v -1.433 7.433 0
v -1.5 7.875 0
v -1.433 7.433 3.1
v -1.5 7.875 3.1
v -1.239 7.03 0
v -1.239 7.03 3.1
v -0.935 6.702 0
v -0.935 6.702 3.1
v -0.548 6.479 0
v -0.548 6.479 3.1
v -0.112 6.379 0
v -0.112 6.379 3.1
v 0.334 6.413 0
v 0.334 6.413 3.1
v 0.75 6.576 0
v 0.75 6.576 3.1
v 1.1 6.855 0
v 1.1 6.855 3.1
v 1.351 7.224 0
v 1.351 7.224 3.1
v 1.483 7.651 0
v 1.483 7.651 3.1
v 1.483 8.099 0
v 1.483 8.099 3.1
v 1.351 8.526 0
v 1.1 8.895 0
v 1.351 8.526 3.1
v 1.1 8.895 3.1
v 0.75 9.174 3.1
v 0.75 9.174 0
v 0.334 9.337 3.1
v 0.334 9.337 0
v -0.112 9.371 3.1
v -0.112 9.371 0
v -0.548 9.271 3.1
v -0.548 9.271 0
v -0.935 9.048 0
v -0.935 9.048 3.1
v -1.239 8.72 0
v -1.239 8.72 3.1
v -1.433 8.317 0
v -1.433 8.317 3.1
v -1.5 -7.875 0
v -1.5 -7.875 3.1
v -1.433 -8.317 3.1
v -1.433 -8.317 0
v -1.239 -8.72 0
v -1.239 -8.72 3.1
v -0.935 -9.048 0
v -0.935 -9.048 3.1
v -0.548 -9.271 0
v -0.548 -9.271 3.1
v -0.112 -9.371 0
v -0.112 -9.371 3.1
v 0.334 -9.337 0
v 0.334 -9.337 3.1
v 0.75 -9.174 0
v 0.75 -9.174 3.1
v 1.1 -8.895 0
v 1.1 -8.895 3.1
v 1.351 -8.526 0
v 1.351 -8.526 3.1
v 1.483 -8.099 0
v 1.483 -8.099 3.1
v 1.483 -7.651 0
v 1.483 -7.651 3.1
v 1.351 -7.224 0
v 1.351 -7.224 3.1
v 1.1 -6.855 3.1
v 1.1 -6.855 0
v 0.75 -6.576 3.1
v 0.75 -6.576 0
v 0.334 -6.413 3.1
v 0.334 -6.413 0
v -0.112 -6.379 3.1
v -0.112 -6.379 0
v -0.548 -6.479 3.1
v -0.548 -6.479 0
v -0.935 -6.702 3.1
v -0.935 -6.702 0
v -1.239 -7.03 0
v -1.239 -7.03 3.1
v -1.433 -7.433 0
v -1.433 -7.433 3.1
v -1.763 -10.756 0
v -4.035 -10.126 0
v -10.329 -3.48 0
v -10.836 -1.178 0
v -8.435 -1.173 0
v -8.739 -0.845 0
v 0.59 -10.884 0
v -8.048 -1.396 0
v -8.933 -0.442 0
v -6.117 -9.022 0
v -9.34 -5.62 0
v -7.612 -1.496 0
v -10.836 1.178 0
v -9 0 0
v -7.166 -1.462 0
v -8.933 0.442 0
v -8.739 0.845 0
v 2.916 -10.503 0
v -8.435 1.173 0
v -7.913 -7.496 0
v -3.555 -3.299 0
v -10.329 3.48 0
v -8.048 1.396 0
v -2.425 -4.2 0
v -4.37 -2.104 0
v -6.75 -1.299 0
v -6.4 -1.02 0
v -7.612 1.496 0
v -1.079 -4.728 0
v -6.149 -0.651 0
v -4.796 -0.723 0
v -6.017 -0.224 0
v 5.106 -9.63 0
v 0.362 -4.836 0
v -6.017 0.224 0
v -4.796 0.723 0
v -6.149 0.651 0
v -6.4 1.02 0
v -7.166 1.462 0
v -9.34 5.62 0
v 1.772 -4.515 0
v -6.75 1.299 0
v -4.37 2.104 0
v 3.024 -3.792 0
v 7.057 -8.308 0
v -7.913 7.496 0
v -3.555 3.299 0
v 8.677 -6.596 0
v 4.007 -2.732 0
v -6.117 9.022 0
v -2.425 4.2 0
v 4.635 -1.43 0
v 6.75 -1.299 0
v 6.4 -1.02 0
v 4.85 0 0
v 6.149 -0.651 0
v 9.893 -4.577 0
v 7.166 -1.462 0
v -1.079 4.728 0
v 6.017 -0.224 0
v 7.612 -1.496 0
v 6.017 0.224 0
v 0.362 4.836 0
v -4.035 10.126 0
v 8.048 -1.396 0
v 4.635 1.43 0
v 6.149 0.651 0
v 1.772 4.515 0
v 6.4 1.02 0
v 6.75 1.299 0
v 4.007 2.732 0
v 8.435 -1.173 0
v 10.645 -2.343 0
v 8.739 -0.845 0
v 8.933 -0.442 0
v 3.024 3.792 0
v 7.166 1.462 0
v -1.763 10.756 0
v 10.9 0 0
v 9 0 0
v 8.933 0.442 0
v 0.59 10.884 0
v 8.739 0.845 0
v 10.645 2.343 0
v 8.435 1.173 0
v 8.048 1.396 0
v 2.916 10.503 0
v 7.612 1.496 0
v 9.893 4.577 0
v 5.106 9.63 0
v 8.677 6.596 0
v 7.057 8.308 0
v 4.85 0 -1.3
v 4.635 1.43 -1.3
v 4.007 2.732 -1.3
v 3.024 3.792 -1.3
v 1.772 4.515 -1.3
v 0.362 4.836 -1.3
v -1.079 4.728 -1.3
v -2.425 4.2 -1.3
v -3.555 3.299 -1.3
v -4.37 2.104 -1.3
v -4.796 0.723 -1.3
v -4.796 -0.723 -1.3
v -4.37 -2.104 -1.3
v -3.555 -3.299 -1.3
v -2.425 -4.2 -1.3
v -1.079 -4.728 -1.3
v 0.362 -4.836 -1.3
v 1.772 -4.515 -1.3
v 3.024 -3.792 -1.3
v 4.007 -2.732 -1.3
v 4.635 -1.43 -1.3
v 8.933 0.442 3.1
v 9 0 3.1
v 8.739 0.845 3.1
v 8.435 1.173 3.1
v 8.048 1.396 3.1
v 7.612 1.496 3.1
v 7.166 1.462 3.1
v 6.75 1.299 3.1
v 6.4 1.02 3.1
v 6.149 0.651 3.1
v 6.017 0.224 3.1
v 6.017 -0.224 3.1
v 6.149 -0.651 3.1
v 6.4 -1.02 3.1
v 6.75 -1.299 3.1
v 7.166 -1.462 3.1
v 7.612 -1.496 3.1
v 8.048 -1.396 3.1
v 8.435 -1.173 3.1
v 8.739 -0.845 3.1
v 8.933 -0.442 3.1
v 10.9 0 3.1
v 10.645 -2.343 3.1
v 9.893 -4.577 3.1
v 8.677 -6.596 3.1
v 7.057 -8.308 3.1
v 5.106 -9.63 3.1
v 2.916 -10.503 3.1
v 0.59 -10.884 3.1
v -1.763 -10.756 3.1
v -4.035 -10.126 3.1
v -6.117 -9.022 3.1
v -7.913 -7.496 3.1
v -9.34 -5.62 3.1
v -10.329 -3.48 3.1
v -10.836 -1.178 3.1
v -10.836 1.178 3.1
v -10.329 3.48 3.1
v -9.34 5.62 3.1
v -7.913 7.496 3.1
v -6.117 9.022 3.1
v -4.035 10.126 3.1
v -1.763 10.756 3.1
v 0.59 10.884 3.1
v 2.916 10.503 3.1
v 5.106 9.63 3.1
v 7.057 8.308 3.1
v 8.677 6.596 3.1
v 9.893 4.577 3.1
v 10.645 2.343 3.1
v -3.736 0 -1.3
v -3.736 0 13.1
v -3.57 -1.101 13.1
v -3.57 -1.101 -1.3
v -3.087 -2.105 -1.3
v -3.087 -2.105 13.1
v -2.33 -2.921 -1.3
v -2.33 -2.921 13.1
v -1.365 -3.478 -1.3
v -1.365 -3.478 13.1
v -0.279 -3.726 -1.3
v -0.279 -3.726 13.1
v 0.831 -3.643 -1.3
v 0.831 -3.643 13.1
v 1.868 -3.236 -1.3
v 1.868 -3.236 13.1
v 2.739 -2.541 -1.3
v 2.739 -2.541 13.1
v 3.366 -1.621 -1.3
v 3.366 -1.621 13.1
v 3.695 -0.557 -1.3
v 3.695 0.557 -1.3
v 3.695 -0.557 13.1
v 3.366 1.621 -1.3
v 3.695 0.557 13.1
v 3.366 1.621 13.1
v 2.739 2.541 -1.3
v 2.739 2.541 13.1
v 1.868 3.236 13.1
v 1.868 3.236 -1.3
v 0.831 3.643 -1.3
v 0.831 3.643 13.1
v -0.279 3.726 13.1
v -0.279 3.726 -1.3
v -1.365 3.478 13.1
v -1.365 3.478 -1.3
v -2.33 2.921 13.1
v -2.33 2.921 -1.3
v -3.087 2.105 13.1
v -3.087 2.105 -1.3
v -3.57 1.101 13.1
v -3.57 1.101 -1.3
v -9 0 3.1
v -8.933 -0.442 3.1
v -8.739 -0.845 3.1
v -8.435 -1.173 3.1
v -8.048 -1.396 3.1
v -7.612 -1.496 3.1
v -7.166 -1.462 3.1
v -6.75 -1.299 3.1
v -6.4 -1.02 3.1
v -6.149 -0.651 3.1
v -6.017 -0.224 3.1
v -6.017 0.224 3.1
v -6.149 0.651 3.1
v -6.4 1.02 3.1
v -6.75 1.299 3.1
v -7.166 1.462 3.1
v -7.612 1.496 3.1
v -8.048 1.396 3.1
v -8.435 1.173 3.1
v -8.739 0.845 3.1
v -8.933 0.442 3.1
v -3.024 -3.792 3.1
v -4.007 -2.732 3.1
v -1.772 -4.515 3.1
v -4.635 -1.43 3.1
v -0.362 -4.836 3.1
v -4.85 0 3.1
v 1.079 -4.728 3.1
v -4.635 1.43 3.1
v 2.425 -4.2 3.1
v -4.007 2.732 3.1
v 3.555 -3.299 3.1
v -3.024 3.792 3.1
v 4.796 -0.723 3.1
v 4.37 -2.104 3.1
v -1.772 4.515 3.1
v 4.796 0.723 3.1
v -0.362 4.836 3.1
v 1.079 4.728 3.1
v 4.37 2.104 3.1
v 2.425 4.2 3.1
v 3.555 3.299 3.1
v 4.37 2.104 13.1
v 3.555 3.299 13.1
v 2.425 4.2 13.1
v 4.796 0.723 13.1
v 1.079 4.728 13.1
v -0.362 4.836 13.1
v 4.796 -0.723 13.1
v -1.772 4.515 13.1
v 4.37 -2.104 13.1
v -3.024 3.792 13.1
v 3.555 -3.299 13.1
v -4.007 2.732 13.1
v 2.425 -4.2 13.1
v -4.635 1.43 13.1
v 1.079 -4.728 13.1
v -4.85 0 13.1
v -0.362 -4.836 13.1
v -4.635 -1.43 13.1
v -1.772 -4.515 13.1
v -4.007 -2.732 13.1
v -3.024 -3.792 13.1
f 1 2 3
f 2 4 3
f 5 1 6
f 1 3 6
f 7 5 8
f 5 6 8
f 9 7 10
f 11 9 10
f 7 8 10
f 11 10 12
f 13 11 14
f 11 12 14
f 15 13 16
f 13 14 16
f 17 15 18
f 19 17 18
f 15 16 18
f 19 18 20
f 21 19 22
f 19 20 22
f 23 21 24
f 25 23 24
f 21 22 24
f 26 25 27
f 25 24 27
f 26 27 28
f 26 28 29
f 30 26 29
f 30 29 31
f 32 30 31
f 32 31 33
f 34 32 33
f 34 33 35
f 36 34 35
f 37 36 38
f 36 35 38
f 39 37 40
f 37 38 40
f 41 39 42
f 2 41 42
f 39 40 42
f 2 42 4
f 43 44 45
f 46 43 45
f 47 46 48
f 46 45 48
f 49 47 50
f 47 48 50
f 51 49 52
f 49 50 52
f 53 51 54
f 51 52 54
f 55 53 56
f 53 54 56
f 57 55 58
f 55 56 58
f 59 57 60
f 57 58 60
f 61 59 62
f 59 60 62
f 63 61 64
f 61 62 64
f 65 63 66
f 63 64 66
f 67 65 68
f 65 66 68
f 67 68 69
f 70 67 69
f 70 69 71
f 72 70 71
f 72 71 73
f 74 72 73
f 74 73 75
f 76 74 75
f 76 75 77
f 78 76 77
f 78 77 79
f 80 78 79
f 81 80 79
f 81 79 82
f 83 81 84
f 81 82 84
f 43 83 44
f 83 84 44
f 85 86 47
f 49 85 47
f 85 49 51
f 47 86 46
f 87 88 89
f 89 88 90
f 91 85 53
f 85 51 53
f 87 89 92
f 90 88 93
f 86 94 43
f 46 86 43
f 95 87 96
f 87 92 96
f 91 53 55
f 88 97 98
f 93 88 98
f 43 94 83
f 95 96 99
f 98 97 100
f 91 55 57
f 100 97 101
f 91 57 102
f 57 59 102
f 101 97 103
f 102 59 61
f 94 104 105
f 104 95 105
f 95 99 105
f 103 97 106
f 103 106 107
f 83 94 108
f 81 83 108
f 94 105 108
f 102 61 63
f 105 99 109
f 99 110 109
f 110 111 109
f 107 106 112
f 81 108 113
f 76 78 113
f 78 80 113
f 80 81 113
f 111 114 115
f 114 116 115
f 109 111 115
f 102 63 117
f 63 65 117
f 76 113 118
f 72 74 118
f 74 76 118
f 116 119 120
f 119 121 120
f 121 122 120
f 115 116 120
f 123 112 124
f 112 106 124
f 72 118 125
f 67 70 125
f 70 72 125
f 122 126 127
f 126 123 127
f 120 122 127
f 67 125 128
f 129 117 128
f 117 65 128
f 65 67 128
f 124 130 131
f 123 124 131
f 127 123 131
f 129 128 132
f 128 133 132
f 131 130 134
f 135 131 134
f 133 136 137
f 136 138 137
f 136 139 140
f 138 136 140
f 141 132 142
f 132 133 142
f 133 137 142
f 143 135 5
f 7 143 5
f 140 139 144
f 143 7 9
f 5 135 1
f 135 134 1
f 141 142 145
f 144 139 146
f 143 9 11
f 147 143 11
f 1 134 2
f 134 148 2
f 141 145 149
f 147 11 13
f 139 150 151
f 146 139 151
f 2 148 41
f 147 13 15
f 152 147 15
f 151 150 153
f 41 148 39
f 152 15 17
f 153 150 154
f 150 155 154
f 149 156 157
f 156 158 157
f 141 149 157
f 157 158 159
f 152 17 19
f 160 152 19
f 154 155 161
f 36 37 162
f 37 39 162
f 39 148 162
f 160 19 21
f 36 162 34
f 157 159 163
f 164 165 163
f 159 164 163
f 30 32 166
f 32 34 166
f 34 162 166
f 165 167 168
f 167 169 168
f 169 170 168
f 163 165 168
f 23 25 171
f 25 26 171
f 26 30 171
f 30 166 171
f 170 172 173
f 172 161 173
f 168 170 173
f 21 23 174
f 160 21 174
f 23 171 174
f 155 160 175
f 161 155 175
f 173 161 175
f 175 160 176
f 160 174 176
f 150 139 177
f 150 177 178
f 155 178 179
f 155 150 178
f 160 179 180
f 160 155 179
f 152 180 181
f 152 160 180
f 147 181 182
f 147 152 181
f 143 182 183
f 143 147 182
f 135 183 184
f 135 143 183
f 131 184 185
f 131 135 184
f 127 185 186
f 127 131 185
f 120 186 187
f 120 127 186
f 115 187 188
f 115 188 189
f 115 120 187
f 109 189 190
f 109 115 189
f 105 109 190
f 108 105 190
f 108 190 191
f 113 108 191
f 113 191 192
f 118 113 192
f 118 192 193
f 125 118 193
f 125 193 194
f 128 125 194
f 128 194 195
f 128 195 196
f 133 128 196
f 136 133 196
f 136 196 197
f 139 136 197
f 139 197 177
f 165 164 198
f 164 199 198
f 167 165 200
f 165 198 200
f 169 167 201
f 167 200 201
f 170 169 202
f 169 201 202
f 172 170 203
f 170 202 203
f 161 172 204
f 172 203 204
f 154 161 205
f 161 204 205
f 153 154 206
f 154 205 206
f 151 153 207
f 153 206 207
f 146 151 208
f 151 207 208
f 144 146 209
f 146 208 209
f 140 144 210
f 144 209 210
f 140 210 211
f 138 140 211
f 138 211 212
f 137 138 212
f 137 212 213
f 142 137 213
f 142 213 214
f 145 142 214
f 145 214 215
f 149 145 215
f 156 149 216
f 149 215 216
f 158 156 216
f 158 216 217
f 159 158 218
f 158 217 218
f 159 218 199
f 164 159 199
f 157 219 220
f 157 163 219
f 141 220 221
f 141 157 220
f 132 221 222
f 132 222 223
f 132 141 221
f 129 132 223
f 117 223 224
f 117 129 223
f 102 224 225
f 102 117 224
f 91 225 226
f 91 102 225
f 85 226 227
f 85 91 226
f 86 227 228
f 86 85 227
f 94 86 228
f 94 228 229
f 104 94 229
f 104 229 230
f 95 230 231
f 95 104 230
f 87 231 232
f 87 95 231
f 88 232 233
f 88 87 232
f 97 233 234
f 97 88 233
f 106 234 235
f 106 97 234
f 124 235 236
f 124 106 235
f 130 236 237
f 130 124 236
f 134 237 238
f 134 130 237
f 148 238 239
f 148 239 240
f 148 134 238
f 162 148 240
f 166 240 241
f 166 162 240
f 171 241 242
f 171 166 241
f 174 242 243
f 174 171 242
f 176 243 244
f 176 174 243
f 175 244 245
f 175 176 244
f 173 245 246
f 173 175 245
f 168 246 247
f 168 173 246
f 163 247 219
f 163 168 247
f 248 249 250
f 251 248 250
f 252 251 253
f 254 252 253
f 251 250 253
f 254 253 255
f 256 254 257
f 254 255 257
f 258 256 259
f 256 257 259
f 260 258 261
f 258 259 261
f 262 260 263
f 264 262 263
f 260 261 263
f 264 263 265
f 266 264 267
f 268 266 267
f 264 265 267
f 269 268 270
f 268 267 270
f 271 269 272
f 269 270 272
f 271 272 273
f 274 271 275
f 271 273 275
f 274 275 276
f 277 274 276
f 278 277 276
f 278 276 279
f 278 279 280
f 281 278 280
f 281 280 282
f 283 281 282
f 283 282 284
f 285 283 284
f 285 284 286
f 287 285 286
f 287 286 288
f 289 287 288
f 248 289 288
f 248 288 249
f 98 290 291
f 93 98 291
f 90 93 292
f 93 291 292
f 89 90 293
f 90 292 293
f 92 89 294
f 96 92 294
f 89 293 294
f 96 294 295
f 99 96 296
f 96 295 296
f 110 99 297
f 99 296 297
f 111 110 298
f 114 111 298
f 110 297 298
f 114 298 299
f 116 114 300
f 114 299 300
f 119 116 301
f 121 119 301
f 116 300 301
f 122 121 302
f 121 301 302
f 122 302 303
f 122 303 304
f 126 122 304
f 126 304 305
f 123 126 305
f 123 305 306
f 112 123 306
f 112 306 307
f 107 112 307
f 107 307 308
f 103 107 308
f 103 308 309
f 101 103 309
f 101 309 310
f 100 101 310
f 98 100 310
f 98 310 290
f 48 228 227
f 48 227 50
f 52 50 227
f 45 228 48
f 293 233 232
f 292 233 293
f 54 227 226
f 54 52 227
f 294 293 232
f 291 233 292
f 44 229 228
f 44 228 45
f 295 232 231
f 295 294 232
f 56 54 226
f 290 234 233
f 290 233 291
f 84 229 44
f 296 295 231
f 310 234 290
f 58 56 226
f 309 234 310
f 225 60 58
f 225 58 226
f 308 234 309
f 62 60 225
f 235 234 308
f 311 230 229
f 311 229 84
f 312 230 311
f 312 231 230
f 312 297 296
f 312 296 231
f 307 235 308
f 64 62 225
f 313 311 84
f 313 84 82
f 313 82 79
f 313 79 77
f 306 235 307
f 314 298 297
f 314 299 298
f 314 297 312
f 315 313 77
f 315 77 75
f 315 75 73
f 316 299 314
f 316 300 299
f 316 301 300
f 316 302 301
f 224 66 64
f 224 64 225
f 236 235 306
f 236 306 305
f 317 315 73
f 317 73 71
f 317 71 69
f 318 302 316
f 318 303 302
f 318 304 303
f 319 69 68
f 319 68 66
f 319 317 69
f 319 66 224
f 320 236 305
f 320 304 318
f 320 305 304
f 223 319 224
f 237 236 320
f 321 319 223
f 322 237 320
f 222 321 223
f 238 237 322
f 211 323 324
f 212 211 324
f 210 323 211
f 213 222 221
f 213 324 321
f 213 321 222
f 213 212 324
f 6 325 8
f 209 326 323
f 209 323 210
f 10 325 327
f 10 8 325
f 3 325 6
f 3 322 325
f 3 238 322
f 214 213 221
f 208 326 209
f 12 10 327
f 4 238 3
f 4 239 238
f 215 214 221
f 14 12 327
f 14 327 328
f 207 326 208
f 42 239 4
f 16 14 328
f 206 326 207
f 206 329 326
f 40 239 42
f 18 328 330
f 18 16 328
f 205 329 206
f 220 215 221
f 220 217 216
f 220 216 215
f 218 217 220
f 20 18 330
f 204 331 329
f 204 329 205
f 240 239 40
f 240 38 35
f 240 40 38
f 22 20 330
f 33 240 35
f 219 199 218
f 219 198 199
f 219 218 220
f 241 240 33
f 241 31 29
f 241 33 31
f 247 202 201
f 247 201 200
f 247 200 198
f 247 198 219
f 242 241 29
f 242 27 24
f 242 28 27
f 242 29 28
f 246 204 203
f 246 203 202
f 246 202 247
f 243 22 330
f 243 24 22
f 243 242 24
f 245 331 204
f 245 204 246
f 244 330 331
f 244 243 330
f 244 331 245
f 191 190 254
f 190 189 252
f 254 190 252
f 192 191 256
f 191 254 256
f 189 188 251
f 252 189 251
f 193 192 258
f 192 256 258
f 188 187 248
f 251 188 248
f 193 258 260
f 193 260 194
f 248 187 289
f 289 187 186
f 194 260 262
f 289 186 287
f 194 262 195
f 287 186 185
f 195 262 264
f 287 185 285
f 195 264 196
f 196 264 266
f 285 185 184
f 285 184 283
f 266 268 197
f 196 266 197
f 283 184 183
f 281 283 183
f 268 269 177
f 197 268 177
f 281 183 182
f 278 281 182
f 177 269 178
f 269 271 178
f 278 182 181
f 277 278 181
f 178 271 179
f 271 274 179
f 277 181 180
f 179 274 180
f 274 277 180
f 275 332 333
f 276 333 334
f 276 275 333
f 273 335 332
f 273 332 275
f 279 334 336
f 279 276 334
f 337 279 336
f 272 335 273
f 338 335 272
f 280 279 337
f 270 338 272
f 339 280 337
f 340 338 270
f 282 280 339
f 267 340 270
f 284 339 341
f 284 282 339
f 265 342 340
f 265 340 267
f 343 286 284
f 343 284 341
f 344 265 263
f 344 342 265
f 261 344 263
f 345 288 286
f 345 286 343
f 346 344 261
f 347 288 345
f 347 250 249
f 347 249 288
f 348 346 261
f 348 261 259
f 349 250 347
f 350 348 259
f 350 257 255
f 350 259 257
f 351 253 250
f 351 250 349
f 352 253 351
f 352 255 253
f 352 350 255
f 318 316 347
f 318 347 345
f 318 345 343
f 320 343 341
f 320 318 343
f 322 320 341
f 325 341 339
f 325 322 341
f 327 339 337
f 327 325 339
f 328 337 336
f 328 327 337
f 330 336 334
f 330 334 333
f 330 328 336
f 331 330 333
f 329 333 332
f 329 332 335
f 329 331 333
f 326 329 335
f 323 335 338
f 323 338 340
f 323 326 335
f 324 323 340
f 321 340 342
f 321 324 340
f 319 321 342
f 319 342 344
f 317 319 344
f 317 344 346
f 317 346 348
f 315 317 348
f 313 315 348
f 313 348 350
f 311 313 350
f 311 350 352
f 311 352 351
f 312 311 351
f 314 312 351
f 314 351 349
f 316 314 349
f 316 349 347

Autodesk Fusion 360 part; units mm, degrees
sketch "Sketch1" plane through (0, 0, 0) normal (0, 0, 1) x (1, 0, 0)
  circle A0 centre (0, 0) radius 10.9
  dimension "d1" = 21.8
extrude "Extrude1" add sketch "Sketch1" along normal blind 3.1
sketch "Sketch2" plane through (0, 0, 3.1) normal (0, 0, 1) x (-1, 0, 0)
  circle A0 centre (0, 0) radius 10.9
  circle A1 centre (0, 0) radius 4.85
  dimension "d4" = 9.7
extrude "Extrude2" add sketch "Sketch2" along normal blind 10 contours A1
sketch "Sketch3" plane through (0, 0, 0) normal (0, 0, 1) x (1, 0, 0)
  circle A0 centre (0, 0) radius 4.85
  dimension "d7" = 9.7
extrude "Extrude3" add sketch "Sketch3" against normal blind 1.3
sketch "Sketch4" plane through (0, 0, 13.1) normal (0, 0, 1) x (-1, 0, 0)
  circle A0 centre (0, 0) radius 4.85
  circle A1 centre (0, 0) radius 3.5
  dimension "d10" = 7
extrude "Extrude4" cut sketch "Sketch4" against normal through all contours A1
thread "Thread1" "ACME Screw Threads 3/8 0.3750 0.3750 4G" major diameter 9.906 minor diameter 7.4727 pitch 2.1167 angle 29 resizes the face on face at (-3.4826, 0.3485, 8.3)
sketch "Sketch5" plane through (0, 0, 3.1) normal (0, 0, 1) x (-1, 0, 0)
  circle A0 centre (0, 0) radius 4.85
  circle A1 centre (0, 0) radius 10.9
  line L0 (-10.9, 0) -> (10.9, 0) construction
  circle A2 centre (7.5, 0) radius 1.5
  circle A3 centre (7.5, 0) radius 1.5
  dimension "d14" = 3
  dimension "d18" = 3
extrude "Extrude5" cut sketch "Sketch5" against normal through all contours A2 A3
mirror "Mirror1" about plane through (0, 0, 0) normal (1, 0, 0) of "Extrude5"
sketch "Sketch6" plane through (0, 0, 3.1) normal (0, 0, 1) x (-1, 0, 0)
  circle A0 centre (-7.5, 0) radius 1.5
  circle A1 centre (7.5, 0) radius 1.5
  circle A2 centre (0, 0) radius 4.85
  circle A3 centre (0, 0) radius 10.9
  circle A4 centre (0, -7.875) radius 1.5
  line L0 (0, -4.85) -> (0, -10.9) construction
  dimension "d19" = 3
extrude "Extrude6" cut sketch "Sketch6" against normal through all contours A4
mirror "Mirror2" about plane through (0, 0, 0) normal (0, 1, 0) of "Extrude6"
